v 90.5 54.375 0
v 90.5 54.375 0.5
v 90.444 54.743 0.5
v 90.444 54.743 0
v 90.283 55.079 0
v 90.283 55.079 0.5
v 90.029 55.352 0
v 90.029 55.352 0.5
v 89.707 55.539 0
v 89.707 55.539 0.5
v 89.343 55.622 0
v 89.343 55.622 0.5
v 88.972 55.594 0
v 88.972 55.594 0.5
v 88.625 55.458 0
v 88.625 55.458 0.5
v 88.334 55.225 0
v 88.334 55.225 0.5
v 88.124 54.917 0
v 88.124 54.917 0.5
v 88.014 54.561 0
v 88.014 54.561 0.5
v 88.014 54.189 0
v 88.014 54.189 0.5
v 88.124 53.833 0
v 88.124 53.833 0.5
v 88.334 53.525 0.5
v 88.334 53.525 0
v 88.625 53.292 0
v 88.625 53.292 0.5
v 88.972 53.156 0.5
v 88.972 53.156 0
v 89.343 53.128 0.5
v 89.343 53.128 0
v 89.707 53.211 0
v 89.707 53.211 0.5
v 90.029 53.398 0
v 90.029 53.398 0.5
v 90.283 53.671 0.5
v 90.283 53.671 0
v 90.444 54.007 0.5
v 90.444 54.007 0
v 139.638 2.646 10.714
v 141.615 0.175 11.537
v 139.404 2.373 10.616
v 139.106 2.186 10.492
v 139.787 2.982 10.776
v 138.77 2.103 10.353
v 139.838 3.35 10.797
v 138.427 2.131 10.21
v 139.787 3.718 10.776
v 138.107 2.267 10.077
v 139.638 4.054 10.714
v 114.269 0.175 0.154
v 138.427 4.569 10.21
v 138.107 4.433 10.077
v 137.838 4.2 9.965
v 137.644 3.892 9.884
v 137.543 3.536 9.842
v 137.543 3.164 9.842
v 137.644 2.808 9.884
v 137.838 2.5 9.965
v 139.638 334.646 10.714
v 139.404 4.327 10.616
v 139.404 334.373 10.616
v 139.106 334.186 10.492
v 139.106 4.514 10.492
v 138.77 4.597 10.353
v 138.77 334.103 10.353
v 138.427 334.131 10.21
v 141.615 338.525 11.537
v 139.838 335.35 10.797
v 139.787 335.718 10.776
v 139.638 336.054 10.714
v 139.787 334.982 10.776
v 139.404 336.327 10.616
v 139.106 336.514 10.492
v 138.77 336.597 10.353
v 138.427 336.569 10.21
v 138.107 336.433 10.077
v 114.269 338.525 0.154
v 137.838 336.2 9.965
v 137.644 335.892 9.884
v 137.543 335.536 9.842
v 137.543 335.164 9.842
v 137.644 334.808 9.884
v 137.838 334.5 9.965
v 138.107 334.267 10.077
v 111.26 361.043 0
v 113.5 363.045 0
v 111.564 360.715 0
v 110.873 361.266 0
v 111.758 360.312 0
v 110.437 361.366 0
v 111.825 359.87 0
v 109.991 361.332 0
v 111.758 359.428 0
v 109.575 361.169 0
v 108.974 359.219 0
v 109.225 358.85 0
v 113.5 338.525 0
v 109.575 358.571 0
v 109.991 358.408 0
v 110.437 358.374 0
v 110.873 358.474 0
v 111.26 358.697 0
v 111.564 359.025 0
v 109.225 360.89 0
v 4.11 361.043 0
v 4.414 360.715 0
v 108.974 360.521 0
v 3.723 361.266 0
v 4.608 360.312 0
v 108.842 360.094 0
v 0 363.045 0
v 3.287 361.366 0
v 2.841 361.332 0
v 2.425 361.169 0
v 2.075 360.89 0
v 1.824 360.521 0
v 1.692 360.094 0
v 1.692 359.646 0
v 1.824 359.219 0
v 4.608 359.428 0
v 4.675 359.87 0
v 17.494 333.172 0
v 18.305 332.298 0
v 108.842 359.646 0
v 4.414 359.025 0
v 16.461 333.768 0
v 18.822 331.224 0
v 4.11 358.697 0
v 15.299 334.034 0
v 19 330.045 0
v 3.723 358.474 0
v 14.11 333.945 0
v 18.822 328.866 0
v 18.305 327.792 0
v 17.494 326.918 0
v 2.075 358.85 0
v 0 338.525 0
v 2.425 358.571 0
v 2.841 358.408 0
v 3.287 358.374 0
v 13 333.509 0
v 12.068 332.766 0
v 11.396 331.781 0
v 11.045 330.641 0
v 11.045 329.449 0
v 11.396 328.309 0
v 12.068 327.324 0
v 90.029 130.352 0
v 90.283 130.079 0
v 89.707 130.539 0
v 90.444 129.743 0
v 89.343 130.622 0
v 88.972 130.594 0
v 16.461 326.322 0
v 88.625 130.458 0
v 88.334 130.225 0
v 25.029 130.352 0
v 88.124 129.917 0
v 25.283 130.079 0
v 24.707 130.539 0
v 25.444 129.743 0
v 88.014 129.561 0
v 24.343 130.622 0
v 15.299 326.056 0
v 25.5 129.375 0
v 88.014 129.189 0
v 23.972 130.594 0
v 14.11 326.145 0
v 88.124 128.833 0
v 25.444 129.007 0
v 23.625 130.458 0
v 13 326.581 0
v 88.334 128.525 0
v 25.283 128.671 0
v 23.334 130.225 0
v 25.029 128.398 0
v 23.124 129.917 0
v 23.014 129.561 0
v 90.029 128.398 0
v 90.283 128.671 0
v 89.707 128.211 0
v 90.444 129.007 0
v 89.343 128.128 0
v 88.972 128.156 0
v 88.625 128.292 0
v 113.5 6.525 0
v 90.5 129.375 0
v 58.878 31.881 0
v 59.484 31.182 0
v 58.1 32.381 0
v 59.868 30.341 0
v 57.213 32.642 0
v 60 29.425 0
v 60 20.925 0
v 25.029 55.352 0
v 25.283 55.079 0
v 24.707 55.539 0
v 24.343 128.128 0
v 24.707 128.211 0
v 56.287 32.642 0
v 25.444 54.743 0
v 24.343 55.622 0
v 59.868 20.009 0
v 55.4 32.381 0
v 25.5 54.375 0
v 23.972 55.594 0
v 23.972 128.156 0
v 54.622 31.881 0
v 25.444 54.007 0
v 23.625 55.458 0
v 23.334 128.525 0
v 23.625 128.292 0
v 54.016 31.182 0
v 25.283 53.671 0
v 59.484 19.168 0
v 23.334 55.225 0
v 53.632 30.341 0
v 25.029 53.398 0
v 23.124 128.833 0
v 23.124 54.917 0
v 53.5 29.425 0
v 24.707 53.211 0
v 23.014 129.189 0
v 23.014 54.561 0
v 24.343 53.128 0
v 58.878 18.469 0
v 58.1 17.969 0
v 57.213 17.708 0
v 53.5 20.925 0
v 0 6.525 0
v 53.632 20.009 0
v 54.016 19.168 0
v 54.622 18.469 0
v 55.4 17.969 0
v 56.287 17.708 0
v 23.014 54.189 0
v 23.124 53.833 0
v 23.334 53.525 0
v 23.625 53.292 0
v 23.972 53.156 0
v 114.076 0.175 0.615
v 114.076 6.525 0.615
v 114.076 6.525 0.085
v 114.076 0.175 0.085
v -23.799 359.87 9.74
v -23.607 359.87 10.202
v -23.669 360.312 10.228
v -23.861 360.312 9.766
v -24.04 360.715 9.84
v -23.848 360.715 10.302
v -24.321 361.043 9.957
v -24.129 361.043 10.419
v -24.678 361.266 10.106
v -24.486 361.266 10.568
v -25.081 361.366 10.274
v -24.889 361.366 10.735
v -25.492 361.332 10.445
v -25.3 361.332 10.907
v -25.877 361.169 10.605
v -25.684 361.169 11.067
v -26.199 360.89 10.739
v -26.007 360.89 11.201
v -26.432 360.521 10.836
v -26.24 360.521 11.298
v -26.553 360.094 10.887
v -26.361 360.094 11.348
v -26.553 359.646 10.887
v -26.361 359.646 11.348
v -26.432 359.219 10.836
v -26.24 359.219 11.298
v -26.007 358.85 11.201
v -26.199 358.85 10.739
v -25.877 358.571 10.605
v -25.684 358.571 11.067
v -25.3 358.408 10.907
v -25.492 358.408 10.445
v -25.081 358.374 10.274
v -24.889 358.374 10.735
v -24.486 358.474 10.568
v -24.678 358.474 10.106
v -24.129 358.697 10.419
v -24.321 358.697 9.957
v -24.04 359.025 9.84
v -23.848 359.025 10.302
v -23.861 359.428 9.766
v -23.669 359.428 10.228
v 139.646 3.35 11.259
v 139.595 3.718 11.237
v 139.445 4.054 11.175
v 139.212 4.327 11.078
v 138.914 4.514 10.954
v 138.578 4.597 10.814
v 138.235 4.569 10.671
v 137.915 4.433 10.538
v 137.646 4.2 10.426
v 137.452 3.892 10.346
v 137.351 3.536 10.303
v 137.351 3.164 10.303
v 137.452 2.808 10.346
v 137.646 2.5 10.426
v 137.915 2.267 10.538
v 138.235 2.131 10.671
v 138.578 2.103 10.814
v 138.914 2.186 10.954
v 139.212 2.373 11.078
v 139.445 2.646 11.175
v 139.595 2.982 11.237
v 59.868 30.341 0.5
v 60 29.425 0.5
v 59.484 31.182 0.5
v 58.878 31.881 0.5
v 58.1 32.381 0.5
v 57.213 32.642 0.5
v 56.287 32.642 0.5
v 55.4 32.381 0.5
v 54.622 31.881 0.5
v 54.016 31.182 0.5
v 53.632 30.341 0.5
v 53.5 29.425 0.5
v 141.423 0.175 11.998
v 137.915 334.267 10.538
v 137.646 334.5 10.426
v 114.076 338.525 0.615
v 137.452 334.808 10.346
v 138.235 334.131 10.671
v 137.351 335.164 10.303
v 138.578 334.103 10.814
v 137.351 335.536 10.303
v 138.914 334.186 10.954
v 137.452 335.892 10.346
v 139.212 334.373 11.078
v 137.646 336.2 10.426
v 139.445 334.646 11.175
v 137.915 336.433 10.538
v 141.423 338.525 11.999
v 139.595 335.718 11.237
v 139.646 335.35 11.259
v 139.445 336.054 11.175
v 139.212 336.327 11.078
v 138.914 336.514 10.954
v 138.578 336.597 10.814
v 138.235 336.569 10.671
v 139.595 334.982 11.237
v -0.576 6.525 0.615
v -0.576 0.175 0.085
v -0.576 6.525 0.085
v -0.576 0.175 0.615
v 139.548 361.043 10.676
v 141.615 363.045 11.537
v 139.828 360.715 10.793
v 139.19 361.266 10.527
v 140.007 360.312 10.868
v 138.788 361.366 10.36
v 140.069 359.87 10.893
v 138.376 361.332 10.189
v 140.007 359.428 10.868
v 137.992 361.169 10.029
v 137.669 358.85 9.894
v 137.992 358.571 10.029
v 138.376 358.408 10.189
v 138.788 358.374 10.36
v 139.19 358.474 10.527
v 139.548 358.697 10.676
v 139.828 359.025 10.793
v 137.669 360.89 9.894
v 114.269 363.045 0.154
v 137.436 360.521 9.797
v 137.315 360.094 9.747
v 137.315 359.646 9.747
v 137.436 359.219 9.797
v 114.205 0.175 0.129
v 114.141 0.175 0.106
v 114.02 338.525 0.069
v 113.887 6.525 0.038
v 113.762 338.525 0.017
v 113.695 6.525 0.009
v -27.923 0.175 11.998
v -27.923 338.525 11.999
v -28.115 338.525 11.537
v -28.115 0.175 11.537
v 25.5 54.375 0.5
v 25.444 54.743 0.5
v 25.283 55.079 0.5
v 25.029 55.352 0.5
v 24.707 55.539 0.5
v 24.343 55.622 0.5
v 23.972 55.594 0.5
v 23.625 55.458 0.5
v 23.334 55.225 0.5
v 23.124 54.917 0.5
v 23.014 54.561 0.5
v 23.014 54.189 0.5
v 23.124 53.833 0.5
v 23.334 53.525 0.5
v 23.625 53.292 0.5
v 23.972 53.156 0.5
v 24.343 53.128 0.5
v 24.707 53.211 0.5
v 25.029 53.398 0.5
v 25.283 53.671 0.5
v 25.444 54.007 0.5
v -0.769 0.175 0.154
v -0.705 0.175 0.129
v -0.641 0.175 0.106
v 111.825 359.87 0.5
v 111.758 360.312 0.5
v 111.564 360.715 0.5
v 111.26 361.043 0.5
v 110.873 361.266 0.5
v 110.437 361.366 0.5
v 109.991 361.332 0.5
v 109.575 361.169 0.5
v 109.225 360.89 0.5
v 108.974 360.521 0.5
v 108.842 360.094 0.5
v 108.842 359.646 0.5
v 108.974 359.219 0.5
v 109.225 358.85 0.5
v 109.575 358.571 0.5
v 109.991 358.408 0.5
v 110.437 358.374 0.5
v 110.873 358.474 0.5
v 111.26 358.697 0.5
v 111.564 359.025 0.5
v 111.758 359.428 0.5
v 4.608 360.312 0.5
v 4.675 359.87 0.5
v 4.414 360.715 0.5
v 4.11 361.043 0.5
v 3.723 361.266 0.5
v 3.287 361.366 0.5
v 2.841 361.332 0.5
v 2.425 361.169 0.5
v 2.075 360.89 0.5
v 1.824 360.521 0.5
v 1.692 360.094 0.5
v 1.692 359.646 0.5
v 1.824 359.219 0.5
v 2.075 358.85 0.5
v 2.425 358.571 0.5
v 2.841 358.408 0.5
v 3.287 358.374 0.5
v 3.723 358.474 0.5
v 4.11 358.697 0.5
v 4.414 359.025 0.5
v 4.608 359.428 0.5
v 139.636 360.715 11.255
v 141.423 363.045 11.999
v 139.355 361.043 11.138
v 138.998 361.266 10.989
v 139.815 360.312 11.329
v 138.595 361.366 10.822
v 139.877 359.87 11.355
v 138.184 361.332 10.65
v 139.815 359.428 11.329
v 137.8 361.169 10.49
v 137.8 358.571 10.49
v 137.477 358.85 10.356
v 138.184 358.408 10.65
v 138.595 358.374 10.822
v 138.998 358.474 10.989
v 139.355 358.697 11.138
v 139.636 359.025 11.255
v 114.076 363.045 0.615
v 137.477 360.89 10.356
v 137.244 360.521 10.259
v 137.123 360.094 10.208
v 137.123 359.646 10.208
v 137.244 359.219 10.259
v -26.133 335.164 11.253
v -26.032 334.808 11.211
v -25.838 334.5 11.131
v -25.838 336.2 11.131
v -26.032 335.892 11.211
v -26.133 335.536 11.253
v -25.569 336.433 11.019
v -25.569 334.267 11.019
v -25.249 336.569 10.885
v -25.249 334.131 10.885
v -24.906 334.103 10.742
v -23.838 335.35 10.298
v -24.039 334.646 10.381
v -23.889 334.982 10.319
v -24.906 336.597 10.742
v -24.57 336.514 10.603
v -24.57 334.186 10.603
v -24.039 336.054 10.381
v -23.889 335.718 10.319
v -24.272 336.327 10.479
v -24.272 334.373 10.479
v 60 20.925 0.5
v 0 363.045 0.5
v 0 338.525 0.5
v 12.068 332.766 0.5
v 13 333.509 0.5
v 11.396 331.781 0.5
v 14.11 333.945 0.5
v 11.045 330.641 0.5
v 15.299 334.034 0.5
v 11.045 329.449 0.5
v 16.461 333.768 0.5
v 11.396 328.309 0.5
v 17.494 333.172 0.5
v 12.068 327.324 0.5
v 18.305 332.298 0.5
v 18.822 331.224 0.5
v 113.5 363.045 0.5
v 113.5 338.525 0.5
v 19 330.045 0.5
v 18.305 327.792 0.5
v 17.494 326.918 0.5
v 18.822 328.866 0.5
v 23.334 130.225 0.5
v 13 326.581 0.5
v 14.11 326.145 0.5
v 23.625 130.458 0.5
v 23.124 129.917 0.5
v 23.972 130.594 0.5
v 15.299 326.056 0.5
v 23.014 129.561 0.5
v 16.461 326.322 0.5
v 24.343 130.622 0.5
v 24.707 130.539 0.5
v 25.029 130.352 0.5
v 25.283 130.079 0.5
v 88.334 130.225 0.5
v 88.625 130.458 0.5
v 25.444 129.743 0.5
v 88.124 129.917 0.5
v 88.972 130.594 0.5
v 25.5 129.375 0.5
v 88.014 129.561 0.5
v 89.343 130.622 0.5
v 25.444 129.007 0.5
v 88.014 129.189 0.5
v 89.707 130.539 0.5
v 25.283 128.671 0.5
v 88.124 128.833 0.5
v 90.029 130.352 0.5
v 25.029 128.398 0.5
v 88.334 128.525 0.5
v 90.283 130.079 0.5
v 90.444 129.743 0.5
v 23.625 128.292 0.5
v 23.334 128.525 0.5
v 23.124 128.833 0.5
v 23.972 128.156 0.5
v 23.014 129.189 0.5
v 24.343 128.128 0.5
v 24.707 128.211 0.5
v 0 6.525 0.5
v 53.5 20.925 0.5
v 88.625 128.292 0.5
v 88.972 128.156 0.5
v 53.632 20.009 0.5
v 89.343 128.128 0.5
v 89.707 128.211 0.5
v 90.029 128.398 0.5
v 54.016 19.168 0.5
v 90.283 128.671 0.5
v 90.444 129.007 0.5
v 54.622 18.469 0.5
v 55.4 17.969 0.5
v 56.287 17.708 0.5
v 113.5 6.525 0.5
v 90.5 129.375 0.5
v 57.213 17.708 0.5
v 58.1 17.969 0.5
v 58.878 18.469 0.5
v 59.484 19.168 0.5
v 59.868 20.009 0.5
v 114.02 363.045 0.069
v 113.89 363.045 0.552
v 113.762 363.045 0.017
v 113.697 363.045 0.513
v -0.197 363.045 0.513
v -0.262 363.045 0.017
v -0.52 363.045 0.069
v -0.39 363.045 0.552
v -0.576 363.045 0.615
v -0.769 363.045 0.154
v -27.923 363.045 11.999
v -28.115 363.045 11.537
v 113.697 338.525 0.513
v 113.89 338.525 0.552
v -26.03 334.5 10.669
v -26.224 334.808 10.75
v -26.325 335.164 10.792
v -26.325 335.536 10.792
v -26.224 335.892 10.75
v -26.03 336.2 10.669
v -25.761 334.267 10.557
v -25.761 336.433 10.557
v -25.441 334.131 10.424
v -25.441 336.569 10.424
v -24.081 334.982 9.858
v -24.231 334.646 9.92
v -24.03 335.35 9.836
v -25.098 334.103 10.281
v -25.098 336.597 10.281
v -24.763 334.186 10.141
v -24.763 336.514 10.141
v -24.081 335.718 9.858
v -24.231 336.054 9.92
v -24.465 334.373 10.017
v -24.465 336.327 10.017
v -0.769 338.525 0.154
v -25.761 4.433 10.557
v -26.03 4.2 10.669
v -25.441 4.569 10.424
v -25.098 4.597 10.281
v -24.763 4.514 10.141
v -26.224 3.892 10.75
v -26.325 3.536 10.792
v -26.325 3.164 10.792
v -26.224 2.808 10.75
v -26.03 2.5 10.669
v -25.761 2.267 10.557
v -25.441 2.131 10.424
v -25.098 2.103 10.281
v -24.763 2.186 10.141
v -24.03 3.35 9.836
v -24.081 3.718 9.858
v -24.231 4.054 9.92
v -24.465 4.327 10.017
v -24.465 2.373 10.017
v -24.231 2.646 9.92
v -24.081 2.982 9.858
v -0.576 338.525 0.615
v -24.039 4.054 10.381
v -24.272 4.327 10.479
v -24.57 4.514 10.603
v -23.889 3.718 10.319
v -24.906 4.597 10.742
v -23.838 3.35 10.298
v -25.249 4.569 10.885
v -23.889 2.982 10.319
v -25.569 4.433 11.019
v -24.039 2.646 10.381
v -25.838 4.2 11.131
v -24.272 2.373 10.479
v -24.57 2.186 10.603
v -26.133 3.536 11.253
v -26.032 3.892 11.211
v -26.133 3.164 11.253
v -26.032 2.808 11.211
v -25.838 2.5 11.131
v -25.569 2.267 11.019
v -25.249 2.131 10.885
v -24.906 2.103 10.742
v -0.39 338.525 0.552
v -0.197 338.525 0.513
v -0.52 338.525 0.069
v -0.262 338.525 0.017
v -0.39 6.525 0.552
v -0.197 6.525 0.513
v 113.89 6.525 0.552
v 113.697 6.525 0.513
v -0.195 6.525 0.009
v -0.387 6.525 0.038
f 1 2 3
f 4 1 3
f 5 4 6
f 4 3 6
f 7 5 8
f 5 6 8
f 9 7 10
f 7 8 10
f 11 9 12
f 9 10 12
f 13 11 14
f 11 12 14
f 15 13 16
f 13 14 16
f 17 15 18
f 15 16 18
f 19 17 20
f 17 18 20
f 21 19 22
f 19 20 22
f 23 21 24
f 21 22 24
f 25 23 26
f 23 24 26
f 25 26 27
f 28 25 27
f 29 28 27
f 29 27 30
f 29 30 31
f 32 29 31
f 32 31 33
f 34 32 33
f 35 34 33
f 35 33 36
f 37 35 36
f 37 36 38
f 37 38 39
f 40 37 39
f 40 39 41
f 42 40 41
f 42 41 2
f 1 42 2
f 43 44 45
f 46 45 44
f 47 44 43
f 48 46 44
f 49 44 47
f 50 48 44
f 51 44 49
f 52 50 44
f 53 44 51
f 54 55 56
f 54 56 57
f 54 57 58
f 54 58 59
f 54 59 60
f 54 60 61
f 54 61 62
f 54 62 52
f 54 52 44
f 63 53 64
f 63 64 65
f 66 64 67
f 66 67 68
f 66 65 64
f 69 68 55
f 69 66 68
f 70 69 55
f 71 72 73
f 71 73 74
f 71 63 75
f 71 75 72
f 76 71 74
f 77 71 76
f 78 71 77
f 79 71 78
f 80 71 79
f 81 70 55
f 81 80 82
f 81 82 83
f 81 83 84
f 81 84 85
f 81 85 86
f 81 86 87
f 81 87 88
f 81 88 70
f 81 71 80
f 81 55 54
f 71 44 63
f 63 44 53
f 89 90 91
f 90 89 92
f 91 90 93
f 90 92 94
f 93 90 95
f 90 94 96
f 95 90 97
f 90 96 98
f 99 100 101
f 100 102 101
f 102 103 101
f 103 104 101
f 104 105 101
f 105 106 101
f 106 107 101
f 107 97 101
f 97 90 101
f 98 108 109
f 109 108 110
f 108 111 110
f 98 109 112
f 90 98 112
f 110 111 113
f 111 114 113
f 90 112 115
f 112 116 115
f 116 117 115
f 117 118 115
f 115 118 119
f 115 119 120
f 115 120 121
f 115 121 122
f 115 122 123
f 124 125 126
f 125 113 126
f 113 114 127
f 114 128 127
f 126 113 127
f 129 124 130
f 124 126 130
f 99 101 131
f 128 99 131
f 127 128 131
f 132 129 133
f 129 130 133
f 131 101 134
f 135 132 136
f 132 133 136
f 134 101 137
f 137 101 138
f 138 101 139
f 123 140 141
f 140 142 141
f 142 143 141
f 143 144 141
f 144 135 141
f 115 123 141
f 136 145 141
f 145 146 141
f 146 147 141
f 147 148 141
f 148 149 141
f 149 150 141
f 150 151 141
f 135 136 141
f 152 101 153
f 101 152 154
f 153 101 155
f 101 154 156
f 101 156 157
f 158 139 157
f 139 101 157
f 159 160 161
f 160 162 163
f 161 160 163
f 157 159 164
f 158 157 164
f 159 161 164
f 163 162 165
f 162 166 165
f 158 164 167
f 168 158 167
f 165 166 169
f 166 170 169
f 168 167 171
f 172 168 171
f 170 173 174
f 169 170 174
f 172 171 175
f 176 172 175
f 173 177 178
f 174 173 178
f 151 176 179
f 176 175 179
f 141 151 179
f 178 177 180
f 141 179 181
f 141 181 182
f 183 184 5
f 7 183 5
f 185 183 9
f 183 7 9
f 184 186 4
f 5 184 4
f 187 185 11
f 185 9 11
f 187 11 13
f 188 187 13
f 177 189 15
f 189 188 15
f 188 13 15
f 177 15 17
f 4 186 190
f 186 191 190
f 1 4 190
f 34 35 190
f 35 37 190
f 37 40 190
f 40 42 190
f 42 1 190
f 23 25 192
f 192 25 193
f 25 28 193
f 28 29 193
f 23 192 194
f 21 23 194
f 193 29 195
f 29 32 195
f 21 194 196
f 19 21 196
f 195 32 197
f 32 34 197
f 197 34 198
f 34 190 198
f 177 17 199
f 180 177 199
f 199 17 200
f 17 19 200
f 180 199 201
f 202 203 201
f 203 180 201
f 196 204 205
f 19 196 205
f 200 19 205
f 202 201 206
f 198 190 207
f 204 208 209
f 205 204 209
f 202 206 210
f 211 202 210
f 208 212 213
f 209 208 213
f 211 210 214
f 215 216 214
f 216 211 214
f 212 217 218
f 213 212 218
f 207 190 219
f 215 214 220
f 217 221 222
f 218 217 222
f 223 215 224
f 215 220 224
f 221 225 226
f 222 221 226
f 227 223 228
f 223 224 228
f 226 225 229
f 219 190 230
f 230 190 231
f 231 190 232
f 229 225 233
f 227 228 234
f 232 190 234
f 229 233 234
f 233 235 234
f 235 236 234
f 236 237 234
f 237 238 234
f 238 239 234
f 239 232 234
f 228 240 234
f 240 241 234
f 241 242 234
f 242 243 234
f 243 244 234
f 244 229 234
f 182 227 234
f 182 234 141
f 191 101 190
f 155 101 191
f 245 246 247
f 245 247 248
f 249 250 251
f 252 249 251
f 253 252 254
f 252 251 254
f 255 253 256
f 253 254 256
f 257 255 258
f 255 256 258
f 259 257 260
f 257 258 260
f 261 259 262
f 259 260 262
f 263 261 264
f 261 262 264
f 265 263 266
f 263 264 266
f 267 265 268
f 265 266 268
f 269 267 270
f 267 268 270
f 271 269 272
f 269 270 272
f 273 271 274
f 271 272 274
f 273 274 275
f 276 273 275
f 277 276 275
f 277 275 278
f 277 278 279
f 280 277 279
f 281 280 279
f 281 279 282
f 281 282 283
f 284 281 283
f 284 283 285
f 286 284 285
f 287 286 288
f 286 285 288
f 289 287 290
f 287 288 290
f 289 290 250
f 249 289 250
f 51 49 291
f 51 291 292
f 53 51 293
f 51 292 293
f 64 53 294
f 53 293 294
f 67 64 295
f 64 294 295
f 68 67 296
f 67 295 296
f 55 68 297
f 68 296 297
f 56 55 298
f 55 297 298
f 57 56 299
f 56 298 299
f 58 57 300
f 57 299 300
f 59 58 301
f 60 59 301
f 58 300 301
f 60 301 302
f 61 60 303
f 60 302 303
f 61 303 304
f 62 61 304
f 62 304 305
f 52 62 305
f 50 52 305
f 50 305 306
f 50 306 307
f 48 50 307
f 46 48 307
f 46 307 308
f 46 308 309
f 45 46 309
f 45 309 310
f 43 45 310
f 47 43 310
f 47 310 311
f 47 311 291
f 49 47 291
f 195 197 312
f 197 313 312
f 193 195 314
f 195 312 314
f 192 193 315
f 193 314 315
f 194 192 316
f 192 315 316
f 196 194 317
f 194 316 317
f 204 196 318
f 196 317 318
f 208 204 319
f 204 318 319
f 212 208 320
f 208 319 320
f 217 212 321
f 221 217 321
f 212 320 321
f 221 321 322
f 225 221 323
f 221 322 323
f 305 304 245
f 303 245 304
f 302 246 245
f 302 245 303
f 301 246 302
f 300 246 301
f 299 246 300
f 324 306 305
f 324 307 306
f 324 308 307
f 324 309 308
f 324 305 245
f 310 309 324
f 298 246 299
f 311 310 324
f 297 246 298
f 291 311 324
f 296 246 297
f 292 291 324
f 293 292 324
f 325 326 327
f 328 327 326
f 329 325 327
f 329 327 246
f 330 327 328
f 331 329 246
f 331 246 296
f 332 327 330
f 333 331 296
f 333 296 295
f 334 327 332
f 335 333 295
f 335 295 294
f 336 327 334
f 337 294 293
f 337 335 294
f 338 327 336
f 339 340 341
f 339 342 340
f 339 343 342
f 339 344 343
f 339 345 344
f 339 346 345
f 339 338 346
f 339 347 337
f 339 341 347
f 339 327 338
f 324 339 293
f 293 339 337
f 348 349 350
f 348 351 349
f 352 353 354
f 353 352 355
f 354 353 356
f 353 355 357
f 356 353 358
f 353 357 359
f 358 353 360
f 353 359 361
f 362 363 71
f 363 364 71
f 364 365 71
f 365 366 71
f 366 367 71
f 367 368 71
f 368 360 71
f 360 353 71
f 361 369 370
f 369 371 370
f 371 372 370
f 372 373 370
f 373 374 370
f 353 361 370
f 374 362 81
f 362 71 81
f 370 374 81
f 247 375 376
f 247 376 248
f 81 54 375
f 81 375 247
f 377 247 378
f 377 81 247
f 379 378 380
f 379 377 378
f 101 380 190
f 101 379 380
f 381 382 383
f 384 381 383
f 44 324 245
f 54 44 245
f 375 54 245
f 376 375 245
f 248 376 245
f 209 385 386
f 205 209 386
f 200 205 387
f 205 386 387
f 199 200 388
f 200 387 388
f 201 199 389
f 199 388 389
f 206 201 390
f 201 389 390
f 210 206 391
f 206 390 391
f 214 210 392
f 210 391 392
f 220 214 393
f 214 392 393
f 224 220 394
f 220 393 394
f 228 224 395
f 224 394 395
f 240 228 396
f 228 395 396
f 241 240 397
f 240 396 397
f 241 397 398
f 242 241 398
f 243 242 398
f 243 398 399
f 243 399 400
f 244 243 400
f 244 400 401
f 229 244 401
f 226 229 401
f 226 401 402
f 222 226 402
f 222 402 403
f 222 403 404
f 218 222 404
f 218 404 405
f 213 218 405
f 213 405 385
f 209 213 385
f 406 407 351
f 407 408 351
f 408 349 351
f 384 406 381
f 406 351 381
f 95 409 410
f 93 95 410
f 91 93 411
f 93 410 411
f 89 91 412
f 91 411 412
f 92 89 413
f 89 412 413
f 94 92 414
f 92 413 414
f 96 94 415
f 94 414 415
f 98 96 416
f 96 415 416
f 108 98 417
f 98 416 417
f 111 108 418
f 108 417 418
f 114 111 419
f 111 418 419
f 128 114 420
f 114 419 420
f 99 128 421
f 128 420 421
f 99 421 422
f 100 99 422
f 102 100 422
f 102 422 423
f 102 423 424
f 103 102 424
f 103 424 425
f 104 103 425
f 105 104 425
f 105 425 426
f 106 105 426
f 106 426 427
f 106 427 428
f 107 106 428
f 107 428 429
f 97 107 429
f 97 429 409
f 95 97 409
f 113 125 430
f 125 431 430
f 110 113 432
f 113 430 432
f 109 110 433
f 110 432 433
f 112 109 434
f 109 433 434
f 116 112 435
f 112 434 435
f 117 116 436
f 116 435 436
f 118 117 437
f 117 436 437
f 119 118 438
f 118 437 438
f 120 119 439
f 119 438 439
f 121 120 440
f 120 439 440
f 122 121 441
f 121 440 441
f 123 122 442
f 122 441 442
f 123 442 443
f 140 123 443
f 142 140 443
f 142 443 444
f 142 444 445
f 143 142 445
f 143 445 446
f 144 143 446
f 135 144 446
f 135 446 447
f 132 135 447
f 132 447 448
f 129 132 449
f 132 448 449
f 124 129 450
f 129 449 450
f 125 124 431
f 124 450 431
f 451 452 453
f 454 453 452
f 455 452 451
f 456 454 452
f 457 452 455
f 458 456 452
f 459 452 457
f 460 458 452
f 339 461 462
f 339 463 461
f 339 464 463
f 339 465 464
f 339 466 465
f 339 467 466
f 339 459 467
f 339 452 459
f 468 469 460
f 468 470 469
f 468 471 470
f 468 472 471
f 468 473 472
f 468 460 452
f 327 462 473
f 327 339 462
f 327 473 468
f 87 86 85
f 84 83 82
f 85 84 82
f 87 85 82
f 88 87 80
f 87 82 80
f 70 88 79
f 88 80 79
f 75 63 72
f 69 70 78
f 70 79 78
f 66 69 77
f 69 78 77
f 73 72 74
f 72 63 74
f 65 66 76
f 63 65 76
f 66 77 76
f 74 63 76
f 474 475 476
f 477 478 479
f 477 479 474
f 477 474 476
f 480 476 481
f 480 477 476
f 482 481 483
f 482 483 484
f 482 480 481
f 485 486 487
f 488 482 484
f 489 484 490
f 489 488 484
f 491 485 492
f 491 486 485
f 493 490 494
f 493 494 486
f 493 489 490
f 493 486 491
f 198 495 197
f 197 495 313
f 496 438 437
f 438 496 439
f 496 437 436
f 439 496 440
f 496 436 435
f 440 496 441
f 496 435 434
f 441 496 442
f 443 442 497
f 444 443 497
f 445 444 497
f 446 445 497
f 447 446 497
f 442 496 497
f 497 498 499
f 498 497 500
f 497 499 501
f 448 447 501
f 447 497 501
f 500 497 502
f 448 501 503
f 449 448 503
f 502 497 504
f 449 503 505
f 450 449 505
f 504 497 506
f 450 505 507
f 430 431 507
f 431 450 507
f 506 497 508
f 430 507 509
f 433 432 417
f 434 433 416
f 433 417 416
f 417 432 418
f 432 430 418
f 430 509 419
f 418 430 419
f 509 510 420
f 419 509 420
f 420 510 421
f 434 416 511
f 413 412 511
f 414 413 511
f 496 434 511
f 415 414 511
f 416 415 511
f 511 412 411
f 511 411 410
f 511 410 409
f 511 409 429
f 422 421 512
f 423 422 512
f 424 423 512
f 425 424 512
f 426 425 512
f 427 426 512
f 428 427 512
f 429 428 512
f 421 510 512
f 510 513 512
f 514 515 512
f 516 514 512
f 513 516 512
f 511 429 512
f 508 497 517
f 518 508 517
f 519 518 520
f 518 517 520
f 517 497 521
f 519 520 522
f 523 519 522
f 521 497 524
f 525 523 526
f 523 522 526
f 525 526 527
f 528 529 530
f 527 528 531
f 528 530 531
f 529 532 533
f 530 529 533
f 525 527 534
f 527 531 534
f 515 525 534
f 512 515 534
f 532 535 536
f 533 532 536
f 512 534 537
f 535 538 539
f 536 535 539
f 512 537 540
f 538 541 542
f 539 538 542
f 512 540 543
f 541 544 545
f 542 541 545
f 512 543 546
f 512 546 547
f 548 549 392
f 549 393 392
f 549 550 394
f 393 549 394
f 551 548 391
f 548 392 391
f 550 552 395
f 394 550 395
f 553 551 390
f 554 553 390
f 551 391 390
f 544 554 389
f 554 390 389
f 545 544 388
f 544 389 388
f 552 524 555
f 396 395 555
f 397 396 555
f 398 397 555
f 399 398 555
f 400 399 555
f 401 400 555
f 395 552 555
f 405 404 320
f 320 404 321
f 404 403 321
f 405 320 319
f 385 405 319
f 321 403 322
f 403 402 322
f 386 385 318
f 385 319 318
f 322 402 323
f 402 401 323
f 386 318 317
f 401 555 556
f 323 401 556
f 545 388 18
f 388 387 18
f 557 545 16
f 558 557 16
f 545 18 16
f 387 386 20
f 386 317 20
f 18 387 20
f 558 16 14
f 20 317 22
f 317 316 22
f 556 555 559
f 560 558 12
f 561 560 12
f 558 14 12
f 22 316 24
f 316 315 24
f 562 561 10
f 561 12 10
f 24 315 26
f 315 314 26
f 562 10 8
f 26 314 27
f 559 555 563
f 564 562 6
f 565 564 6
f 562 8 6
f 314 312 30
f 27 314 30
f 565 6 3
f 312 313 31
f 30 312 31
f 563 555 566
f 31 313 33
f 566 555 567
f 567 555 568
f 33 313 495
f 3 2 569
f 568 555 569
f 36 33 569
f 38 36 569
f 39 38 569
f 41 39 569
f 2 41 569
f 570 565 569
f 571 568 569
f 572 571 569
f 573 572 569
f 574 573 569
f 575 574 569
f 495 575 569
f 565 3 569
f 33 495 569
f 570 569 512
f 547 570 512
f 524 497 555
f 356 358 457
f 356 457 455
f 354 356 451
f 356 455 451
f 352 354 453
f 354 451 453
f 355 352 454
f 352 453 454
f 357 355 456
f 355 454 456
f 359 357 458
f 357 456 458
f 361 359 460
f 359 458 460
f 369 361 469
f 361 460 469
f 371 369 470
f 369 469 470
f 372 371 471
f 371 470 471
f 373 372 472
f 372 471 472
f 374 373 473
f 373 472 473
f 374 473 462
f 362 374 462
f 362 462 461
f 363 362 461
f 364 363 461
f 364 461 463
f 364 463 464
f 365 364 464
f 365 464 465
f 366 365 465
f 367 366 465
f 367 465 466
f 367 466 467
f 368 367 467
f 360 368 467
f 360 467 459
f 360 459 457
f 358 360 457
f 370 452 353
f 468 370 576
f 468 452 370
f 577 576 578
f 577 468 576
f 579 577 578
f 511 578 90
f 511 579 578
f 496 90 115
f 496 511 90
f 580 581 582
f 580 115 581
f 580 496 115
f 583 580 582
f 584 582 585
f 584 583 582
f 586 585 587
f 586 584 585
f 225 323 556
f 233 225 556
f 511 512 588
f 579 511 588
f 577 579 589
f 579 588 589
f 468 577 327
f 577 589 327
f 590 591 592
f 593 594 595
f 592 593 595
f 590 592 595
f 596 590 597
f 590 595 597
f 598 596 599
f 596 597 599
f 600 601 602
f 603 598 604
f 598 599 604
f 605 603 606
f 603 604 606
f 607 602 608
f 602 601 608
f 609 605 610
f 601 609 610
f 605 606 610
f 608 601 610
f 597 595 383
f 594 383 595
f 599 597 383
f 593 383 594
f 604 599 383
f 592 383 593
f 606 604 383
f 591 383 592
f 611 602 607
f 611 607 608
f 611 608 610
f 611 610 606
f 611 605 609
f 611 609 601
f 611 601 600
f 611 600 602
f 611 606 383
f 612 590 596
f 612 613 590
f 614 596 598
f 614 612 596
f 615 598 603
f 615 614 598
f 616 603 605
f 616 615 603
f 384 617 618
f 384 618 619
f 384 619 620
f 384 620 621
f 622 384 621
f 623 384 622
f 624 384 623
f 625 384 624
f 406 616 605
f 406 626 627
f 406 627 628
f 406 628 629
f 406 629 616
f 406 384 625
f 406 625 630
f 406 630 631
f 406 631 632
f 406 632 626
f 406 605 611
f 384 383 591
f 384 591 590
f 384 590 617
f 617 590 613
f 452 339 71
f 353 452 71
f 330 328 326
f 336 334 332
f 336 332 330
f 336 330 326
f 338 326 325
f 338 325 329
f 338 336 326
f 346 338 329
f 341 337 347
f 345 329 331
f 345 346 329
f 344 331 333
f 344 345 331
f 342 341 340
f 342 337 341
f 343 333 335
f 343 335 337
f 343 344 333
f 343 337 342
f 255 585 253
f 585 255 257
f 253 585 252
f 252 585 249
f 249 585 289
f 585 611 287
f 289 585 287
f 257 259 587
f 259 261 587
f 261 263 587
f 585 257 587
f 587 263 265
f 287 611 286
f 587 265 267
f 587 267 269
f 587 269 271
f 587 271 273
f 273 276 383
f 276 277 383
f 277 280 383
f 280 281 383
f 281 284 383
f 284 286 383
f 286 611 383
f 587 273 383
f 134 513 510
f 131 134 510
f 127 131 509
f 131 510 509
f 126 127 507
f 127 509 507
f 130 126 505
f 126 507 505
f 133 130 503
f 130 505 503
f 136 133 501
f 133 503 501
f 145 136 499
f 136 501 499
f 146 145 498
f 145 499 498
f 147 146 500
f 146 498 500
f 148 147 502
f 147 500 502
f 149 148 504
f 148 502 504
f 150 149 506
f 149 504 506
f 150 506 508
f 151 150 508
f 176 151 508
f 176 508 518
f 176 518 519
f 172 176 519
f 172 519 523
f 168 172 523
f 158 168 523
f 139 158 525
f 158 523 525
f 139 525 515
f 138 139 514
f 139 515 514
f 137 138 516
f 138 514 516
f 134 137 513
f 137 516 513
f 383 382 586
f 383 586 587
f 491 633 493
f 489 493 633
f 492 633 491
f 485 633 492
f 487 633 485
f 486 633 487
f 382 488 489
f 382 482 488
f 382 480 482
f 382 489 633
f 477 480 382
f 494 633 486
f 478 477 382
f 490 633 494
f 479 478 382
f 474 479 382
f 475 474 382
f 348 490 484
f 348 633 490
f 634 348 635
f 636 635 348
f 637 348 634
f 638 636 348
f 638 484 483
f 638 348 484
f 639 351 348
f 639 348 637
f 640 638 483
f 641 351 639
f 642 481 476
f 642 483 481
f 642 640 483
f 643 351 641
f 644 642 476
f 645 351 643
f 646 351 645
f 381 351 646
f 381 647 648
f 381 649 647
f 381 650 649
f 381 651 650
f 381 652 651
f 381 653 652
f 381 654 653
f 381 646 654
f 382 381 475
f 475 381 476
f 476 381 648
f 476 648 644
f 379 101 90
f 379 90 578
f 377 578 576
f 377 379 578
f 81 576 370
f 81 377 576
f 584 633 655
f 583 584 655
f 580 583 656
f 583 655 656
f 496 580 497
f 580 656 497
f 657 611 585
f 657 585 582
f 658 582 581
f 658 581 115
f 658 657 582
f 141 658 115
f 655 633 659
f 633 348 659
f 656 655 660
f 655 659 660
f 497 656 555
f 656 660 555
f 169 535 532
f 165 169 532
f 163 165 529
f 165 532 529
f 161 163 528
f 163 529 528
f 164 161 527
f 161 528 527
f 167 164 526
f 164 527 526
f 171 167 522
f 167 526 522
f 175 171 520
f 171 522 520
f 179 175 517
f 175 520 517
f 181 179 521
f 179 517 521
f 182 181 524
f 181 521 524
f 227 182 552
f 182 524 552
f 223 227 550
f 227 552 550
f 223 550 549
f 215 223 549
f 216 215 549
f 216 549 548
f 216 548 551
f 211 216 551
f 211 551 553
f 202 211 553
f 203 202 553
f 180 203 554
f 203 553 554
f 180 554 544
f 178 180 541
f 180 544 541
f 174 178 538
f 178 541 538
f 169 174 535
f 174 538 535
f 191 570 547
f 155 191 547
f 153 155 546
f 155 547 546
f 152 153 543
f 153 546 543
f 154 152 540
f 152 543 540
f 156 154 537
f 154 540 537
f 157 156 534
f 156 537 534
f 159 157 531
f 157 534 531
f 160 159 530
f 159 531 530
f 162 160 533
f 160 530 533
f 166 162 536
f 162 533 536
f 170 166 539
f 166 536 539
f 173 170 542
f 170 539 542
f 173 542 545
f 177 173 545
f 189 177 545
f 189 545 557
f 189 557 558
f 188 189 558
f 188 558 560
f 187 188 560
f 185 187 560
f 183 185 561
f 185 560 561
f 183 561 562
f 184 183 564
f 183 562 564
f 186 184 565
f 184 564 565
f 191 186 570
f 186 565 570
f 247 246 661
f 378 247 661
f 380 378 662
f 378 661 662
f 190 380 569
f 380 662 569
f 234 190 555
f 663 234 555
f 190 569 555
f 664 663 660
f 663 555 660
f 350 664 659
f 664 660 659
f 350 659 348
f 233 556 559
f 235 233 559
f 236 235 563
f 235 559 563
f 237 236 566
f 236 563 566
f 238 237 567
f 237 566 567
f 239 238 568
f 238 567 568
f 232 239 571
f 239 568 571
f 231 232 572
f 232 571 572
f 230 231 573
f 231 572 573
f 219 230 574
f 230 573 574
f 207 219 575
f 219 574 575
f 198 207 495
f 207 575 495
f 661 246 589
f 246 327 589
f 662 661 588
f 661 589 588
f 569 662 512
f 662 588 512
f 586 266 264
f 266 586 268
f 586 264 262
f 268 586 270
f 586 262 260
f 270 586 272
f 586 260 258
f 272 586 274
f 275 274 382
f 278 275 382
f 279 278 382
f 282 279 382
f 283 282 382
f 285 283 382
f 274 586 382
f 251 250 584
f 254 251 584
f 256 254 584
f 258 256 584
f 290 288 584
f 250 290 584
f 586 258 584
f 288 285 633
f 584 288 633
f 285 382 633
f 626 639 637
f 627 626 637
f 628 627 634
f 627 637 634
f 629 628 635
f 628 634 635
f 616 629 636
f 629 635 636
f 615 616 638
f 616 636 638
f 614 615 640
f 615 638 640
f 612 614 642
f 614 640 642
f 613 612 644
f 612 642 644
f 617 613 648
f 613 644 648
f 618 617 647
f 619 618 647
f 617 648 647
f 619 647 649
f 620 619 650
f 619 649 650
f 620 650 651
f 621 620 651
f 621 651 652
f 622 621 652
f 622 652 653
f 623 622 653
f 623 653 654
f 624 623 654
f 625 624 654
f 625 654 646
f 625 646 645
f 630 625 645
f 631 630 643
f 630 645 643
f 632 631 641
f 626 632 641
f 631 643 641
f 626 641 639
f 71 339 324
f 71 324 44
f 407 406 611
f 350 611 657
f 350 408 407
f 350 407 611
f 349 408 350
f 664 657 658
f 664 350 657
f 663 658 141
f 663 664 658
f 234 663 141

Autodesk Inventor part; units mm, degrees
ref_plane "YZ Plane" through (0, 0, 0) normal (1, 0, 0) x (0, 1, 0)
ref_plane "XZ Plane" through (0, 0, 0) normal (0, 1, 0) x (-1, 0, 0)
ref_plane "XY Plane" through (0, 0, 0) normal (0, 0, 1) x (1, 0, 0)
sketch "Sketch1" plane through (0, 0, 0) normal (0, 0, 1) x (1, 0, 0)
  line L0 (0, 0) -> (113.5, 0)
  line L1 (113.5, 0) -> (113.5, 338.525)
  line L2 (113.5, 338.525) -> (0, 338.525)
  line L3 (0, 338.525) -> (0, 0)
  dimension "d0" = 113.5
  dimension "d1" = 338.525
extrude "Plate1" add sketch "Sketch1" along normal blind 0.5
sketch "Sketch2" plane through (114.0764, 338.525, 0.6152) normal (0.3842953, 0, -0.9232102) x (0, 1, 0)
  line L0 (-338.525, 0) -> (0, 0)
  line L1 (0, 0) -> (0, 29.6214)
  line L2 (0, 29.6214) -> (-338.525, 29.6214)
  line L3 (-338.525, 29.6214) -> (-338.525, 0)
edge flange "Flange1" height 30.021 angle 22.6 thickness 0.5 bend radius 1.5 thickness toward (0.3842953, 0, -0.9232102) relief tear relief width 0.5 relief depth 0.25 edges at (113.5, 169.2625, 0.5) wall of the first edge with corners at (114.0764, 0, 0.6152) (114.0764, 338.525, 0.6152) (141.4232, 338.525, 11.9985) (141.4232, 0, 11.9985)
bend "Bend1"
corner "Corner1"
sketch "Sketch3" plane through (-0.5764, 0, 0.6152) normal (-0.3842953, 0, -0.9232102) x (0, -1, 0)
  line L0 (-338.525, 0) -> (0, 0)
  line L1 (0, 0) -> (0, 29.6214)
  line L2 (0, 29.6214) -> (-338.525, 29.6214)
  line L3 (-338.525, 29.6214) -> (-338.525, 0)
edge flange "Flange2" height 30.021 angle 22.6 thickness 0.5 bend radius 1.5 thickness toward (-0.3842953, 0, -0.9232102) relief tear relief width 0.5 relief depth 0.25 edges at (0, 169.2625, 0.5) wall of the first edge with corners at (-0.5764, 338.525, 0.6152) (-0.5764, 0, 0.6152) (-27.9232, 0, 11.9985) (-27.9232, 338.525, 11.9985)
bend "Bend2"
corner "Corner2"
sketch "Sketch4" plane through (-27.9232, 0, 11.9985) normal (0.3842953, 0, 0.9232102) x (0.9232102, 0, -0.3842953)
  line L0 (0, 338.525) -> (0, 0) projected
  line L1 (0, 338.525) -> (0, 335.35) construction
  line L2 (0, 335.35) -> (3.175, 335.35) construction
  circle A0 centre (3.175, 335.35) radius 1.25
  line L3 (0, 0) -> (0, 3.175) construction
  line L4 (0, 3.175) -> (3.175, 3.175) construction
  line L5 (3.175, 3.175) -> (3.175, 3.35) construction
  circle A1 centre (3.175, 3.35) radius 1.25
  point P0 (30.39, 0)
  dimension "d23" = 3.175
  dimension "d24" = 3.175
  dimension "d25" = 2.5
  dimension "d26" = 3.175
  dimension "d27" = 3.175
  dimension "d62" = 0.175
  dimension "d63" = 2.5
extrude "Extrusion1" cut sketch "Sketch4" against normal blind 10
sketch "Sketch5" plane through (0, 0, 0.5) normal (0, 0, 1) x (1, 0, 0)
  line L0 (0, 0) -> (0, 338.525) projected
  line L1 (113.5, 0) -> (0, 0) projected
  line L2 (113.5, 338.525) -> (113.5, 0) projected
  line L3 (0, 338.525) -> (0, 335.35) construction
  line L4 (0, 335.35) -> (3.175, 335.35) construction
  line L5 (113.5, 338.525) -> (113.5, 335.35) construction
  line L6 (113.5, 335.35) -> (110.325, 335.35) construction
  line L7 (0, 0) -> (3.175, 0) construction
  line L8 (0, 0) -> (113.5, 0) construction
  line L9 (3.175, 0) -> (3.175, 3.175) construction
  line L10 (113.5, 0) -> (113.5, 3.175) construction
  line L11 (113.5, 3.175) -> (110.325, 3.175) construction
  circle A0 centre (3.175, 335.35) radius 1.25
  circle A1 centre (110.325, 335.35) radius 1.25
  line L12 (3.175, 3.175) -> (3.175, 3.35) construction
  line L13 (110.325, 3.175) -> (110.325, 3.35) construction
  circle A2 centre (110.325, 3.35) radius 1.25
  circle A3 centre (3.175, 3.35) radius 1.25
  dimension "d31" = 3.175
  dimension "d32" = 3.175
  dimension "d33" = 3.175
  dimension "d34" = 3.175
  dimension "d35" = 3.175
  dimension "d36" = 3.175
  dimension "d37" = 3.175
  dimension "d38" = 3.175
  dimension "d41" = 2.5
  dimension "d42" = 2.5
  dimension "d58" = 0.175
  dimension "d59" = 0.175
  dimension "d60" = 2.5
  dimension "d61" = 2.5
extrude "Extrusion2" cut sketch "Sketch5" against normal blind 10
sketch "Sketch6" plane through (141.4232, 0, 11.9985) normal (-0.3842953, 0, 0.9232102) x (0.9232102, 0, 0.3842953)
  line L0 (0, 338.525) -> (0, 335.35) construction
  line L1 (0, 0) -> (0, 338.525) construction
  line L2 (0, 335.35) -> (-3.175, 335.35) construction
  line L3 (0, 0) -> (0, 3.175) construction
  line L4 (0, 3.175) -> (-3.175, 3.175) construction
  circle A0 centre (-3.175, 335.35) radius 1.25
  line L5 (-3.175, 3.175) -> (-3.175, 3.35) construction
  circle A1 centre (-3.175, 3.35) radius 1.25
  point P0 (-135.1743, 0)
  dimension "d45" = 3.175
  dimension "d46" = 3.175
  dimension "d47" = 3.175
  dimension "d48" = 3.175
  dimension "d50" = 2.5
  dimension "d64" = 0.175
  dimension "d65" = 2.5
extrude "Extrusion3" cut sketch "Sketch6" against normal blind 10
sketch "Sketch7" plane through (0, 0, 0.5) normal (0, 0, 1) x (1, 0, 0)
  line L0 (-71.3896, 0) -> (266.456, 0)
  line L1 (266.456, 0) -> (266.456, 0.175)
  line L2 (266.456, 0.175) -> (-71.3896, 0.175)
  line L3 (-71.3896, 0.175) -> (-71.3896, 0)
  dimension "d53" = 0.175
extrude "Extrusion4" cut sketch "Sketch7" against normal blind 100 and the other way blind 100
sketch "Sketch9" plane through (0, 0, 0.5) normal (0, 0, 1) x (1, 0, 0)
  circle A0 centre (3.175, 3.35) radius 1.25 projected
  circle A1 centre (110.325, 3.35) radius 1.25 projected
  line L0 (-0.5764, 0.175) -> (-0.5764, 338.525) projected
  line L1 (114.0764, 338.525) -> (114.0764, 0.175) projected
  line L2 (-0.5764, 0.175) -> (114.0764, 0.175)
  line L3 (114.0764, 0.175) -> (114.0764, 6.525)
  line L4 (114.0764, 6.525) -> (-0.5764, 6.525)
  line L5 (-0.5764, 6.525) -> (-0.5764, 0.175)
  point P0 (0, 0)
  dimension "d66" = 6.35
extrude "Extrusion5" cut sketch "Sketch9" against normal blind 10 and the other way blind 5
sketch "Sketch10" plane through (0, 0, 0.5) normal (0, 0, 1) x (1, 0, 0)
  line L0 (0, 6.525) -> (0, 338.525) projected
  line L1 (0, 6.525) -> (0, 54.375) construction
  line L2 (0, 54.375) -> (24.25, 54.375) construction
  circle A0 centre (24.25, 54.375) radius 1.25
  line L3 (24.25, 54.375) -> (89.25, 54.375) construction
  circle A1 centre (89.25, 54.375) radius 1.25
  line L4 (24.25, 54.375) -> (24.25, 129.375) construction
  circle A2 centre (24.25, 129.375) radius 1.25
  line L5 (24.25, 129.375) -> (89.25, 129.375) construction
  circle A3 centre (89.25, 129.375) radius 1.25
  point P0 (0, 0)
  dimension "d71" = 47.85
  dimension "d72" = 24.25
  dimension "d73" = 2.5
  dimension "d74" = 65
  dimension "d75" = 2.5
  dimension "d76" = 75
  dimension "d77" = 2.5
  dimension "d78" = 65
  dimension "d79" = 2.5
extrude "Extrusion6" cut sketch "Sketch10" against normal blind 10
sketch "Sketch11" plane through (0, 0, 0.5) normal (0, 0, 1) x (1, 0, 0)
  circle A0 centre (24.25, 54.375) radius 1.25 projected
  line L0 (24.25, 54.375) -> (24.25, 29.425) construction
  line L1 (24.25, 29.425) -> (56.75, 29.425) construction
  line L2 (56.75, 29.425) -> (60, 29.425) construction
  line L3 (60, 29.425) -> (53.5, 29.425)
  line L4 (53.5, 29.425) -> (53.5, 20.925)
  line L5 (53.5, 20.925) -> (60, 20.925)
  line L6 (60, 20.925) -> (60, 29.425)
  circle A1 centre (56.75, 29.425) radius 3.25
  circle A2 centre (56.75, 20.925) radius 3.25
  point P0 (0, 0)
  dimension "d82" = 24.95
  dimension "d83" = 32.5
  dimension "d84" = 3.25
  dimension "d85" = 6.5
  dimension "d86" = 8.5
extrude "Extrusion7" cut sketch "Sketch11" against normal blind 10 contours A1 L3 | L3 A1 | L6 A2 L4 A1 | A2 L5 | L5 A2
sketch "Sketch13" plane through (0, 338.525, 0) normal (0, 1, 0) x (1, 0, 0)
  line L0 (0, -0.5) -> (113.5, -0.5) projected
  line L1 (113.5, 0) -> (113.5, -0.5) projected
  line L2 (113.5, 0) -> (0, 0) projected
  line L3 (0, 0) -> (0, -0.5) projected
extrude "Extrusion8" add sketch "Sketch13" along normal blind 30.87
sketch "Sketch14" plane through (-28.1153, 338.525, 11.5369) normal (0, 1, 0) x (0.9232102, 0, -0.3842953)
  line L0 (29.6214, -0.5) -> (29.6214, 0) projected
  line L1 (29.6214, 0) -> (0, 0) projected
  line L2 (0, -0.5) -> (0, 0) projected
  line L3 (0, -0.5) -> (29.6214, -0.5) projected
  point P0 (30.39, -0.1536)
extrude "Extrusion9" add sketch "Sketch14" along normal blind 30.87
sketch "Sketch15" plane through (0, 338.525, 0.5) normal (0, 1, 0) x (1, 0, 0)
  line L0 (-0.5764, -0.1152) -> (-0.7686, 0.3464) projected
  arc A0 (0, 0) -> (-0.5764, -0.1152) centre (0, -1.5) ccw projected
  line L1 (0, 0.5) -> (0, 0) projected
  arc A1 (0, 0.5) -> (-0.7686, 0.3464) centre (0, -1.5) ccw projected
extrude "Extrusion10" add sketch "Sketch15" along normal blind 30.87
sketch "Sketch16" plane through (113.5, 338.525, 0.5) normal (0, 1, 0) x (1, 0, 0)
  line L0 (0.7686, 0.3464) -> (0.5764, -0.1152) projected
  arc A0 (0.7686, 0.3464) -> (0, 0.5) centre (0, -1.5) ccw projected
  line L1 (0, 0.5) -> (0, 0) projected
  arc A1 (0.5764, -0.1152) -> (0, 0) centre (0, -1.5) ccw projected
  point P0 (-113.5, 0.5)
extrude "Extrusion11" add sketch "Sketch16" along normal blind 30.87
sketch "Sketch17" plane through (114.0764, 338.525, 0.6152) normal (0, 1, 0) x (0.9232102, 0, 0.3842953)
  line L0 (0, 0.5) -> (0, 0) projected
  line L1 (29.6214, 0) -> (0, 0) projected
  line L2 (29.6214, 0) -> (29.6214, 0.5) projected
  line L3 (29.6214, 0.5) -> (0, 0.5) projected
  point P0 (-105.553, -43.2711)
extrude "Extrusion12" add sketch "Sketch17" along normal blind 30.87
sketch "Sketch18" plane through (-27.9232, 0.175, 11.9985) normal (0.3842953, 0, 0.9232102) x (0.9232102, 0, -0.3842953)
  circle A0 centre (3.175, 335.175) radius 1.25 projected
  circle A1 centre (3.175, 335.175) radius 1.25
  point P0 (30.39, -0.175)
  dimension "d100" = 2.5
extrude "Extrusion13" add sketch "Sketch18" against normal up to surface (0.5 mm away)
sketch "Sketch19" plane through (0, 0, 0.5) normal (0, 0, 1) x (1, 0, 0)
  circle A0 centre (110.325, 335.35) radius 1.25 projected
  circle A1 centre (3.175, 335.35) radius 1.25 projected
  point P0 (0, 0)
extrude "Extrusion14" add sketch "Sketch19" against normal up to surface (0.5 mm away)
sketch "Sketch20" plane through (141.4232, 0.175, 11.9985) normal (-0.3842953, 0, 0.9232102) x (0.9232102, 0, 0.3842953)
  circle A0 centre (-3.175, 335.175) radius 1.25 projected
  circle A1 centre (-3.175, 335.175) radius 1.25
  point P0 (-135.1743, -0.175)
extrude "Extrusion15" add sketch "Sketch20" against normal up to surface (0.5 mm away)
sketch "Sketch21" plane through (-27.9232, 0.175, 11.9985) normal (0.3842953, 0, 0.9232102) x (0.9232102, 0, -0.3842953)
  line L0 (0, 369.22) -> (0, 359.695) construction
  line L1 (0, 0) -> (0, 369.22) construction
  line L2 (0, 359.695) -> (3.175, 359.695) construction
  circle A0 centre (3.175, 359.695) radius 1.5
  point P0 (30.39, -0.175)
  dimension "d107" = 9.525
  dimension "d108" = 3.175
  dimension "d109" = 3
extrude "Extrusion16" cut sketch "Sketch21" against normal blind 30.87
sketch "Sketch22" plane through (0, 0, 0.5) normal (0, 0, 1) x (1, 0, 0)
  line L0 (113.5, 6.525) -> (113.5, 369.395) projected
  line L1 (0, 369.395) -> (0, 359.87) construction
  line L2 (0, 6.525) -> (0, 369.395) construction
  line L3 (0, 359.87) -> (3.175, 359.87) construction
  circle A0 centre (3.175, 359.87) radius 1.5
  line L4 (113.5, 6.525) -> (113.5, 369.395) construction
  line L5 (113.5, 369.395) -> (113.5, 359.87) construction
  line L6 (113.5, 359.87) -> (110.325, 359.87) construction
  circle A1 centre (110.325, 359.87) radius 1.5
  point P0 (0, 0)
  dimension "d112" = 9.525
  dimension "d113" = 3.175
  dimension "d114" = 3
  dimension "d115" = 9.525
  dimension "d116" = 3.175
  dimension "d117" = 3
extrude "Extrusion17" cut sketch "Sketch22" against normal blind 30.87
sketch "Sketch23" plane through (141.4232, 0.175, 11.9985) normal (-0.3842953, 0, 0.9232102) x (0.9232102, 0, 0.3842953)
  line L0 (0, 0) -> (0, 369.22) projected
  line L1 (0, 369.22) -> (0, 359.695) construction
  line L2 (0, 359.695) -> (-3.175, 359.695) construction
  circle A0 centre (-3.175, 359.695) radius 1.5
  point P0 (-135.1743, -0.175)
  dimension "d120" = 9.525
  dimension "d121" = 3.175
  dimension "d122" = 3
extrude "Extrusion18" cut sketch "Sketch23" against normal blind 30.87
sketch "Sketch24" plane through (0, 0, 0.5) normal (0, 0, 1) x (1, 0, 0)
  line L0 (-33.1091, 369.395) -> (215.7214, 369.395)
  line L1 (215.7214, 369.395) -> (215.7214, 363.045)
  line L2 (215.7214, 363.045) -> (-33.1091, 363.045)
  line L3 (-33.1091, 363.045) -> (-33.1091, 369.395)
  point P0 (0, 0)
  dimension "d125" = 6.35
extrude "Extrusion19" cut sketch "Sketch24" against normal blind 30.87 and the other way blind 15.435
sketch "Sketch25" plane through (0, 0, 0.5) normal (0, 0, 1) x (1, 0, 0)
  line L0 (0, 363.045) -> (0, 330.045) construction
  line L1 (0, 6.525) -> (0, 363.045) construction
  line L2 (0, 330.045) -> (15, 330.045) construction
  circle A0 centre (15, 330.045) radius 4
  point P0 (0, 0)
  dimension "d130" = 33
  dimension "d131" = 15
  dimension "d132" = 8
extrude "Extrusion20" cut sketch "Sketch25" against normal blind 10
equation "\"d2\" = Thickness"
equation "\"d3\" = BendReliefWidth"
equation "\"d4\" = BendReliefDepth"
equation "\"d5\" = MinimumRemnant"
equation "\"d6\" = TransitionRadius"
equation "\"d10\" = CornerReliefSize"
equation "\"d11\" = GapSize"
equation "\"d12\" = JacobiRadiusSize"
equation "\"d13\" = BendReliefWidth"
equation "\"d14\" = BendReliefDepth"
equation "\"d15\" = MinimumRemnant"
equation "\"d16\" = TransitionRadius"
equation "\"d20\" = CornerReliefSize"
equation "\"d21\" = GapSize"
equation "\"d22\" = JacobiRadiusSize"
equation "\"BendRadius\" = Thickness"
equation "\"BendReliefWidth\" = Thickness"
equation "\"BendReliefDepth\" = 0.5 * Thickness"
equation "\"CornerReliefSize\" = 4 * Thickness"
equation "\"MinimumRemnant\" = 2 * Thickness"
equation "\"TransitionRadius\" = BendRadius"
equation "\"JacobiRadiusSize\" = BendRadius"
equation "\"GapSize\" = Thickness"
equation "\"Thickness\" = 0.5"
properties part number "sideplate part 4" material "Aluminum 6061"
